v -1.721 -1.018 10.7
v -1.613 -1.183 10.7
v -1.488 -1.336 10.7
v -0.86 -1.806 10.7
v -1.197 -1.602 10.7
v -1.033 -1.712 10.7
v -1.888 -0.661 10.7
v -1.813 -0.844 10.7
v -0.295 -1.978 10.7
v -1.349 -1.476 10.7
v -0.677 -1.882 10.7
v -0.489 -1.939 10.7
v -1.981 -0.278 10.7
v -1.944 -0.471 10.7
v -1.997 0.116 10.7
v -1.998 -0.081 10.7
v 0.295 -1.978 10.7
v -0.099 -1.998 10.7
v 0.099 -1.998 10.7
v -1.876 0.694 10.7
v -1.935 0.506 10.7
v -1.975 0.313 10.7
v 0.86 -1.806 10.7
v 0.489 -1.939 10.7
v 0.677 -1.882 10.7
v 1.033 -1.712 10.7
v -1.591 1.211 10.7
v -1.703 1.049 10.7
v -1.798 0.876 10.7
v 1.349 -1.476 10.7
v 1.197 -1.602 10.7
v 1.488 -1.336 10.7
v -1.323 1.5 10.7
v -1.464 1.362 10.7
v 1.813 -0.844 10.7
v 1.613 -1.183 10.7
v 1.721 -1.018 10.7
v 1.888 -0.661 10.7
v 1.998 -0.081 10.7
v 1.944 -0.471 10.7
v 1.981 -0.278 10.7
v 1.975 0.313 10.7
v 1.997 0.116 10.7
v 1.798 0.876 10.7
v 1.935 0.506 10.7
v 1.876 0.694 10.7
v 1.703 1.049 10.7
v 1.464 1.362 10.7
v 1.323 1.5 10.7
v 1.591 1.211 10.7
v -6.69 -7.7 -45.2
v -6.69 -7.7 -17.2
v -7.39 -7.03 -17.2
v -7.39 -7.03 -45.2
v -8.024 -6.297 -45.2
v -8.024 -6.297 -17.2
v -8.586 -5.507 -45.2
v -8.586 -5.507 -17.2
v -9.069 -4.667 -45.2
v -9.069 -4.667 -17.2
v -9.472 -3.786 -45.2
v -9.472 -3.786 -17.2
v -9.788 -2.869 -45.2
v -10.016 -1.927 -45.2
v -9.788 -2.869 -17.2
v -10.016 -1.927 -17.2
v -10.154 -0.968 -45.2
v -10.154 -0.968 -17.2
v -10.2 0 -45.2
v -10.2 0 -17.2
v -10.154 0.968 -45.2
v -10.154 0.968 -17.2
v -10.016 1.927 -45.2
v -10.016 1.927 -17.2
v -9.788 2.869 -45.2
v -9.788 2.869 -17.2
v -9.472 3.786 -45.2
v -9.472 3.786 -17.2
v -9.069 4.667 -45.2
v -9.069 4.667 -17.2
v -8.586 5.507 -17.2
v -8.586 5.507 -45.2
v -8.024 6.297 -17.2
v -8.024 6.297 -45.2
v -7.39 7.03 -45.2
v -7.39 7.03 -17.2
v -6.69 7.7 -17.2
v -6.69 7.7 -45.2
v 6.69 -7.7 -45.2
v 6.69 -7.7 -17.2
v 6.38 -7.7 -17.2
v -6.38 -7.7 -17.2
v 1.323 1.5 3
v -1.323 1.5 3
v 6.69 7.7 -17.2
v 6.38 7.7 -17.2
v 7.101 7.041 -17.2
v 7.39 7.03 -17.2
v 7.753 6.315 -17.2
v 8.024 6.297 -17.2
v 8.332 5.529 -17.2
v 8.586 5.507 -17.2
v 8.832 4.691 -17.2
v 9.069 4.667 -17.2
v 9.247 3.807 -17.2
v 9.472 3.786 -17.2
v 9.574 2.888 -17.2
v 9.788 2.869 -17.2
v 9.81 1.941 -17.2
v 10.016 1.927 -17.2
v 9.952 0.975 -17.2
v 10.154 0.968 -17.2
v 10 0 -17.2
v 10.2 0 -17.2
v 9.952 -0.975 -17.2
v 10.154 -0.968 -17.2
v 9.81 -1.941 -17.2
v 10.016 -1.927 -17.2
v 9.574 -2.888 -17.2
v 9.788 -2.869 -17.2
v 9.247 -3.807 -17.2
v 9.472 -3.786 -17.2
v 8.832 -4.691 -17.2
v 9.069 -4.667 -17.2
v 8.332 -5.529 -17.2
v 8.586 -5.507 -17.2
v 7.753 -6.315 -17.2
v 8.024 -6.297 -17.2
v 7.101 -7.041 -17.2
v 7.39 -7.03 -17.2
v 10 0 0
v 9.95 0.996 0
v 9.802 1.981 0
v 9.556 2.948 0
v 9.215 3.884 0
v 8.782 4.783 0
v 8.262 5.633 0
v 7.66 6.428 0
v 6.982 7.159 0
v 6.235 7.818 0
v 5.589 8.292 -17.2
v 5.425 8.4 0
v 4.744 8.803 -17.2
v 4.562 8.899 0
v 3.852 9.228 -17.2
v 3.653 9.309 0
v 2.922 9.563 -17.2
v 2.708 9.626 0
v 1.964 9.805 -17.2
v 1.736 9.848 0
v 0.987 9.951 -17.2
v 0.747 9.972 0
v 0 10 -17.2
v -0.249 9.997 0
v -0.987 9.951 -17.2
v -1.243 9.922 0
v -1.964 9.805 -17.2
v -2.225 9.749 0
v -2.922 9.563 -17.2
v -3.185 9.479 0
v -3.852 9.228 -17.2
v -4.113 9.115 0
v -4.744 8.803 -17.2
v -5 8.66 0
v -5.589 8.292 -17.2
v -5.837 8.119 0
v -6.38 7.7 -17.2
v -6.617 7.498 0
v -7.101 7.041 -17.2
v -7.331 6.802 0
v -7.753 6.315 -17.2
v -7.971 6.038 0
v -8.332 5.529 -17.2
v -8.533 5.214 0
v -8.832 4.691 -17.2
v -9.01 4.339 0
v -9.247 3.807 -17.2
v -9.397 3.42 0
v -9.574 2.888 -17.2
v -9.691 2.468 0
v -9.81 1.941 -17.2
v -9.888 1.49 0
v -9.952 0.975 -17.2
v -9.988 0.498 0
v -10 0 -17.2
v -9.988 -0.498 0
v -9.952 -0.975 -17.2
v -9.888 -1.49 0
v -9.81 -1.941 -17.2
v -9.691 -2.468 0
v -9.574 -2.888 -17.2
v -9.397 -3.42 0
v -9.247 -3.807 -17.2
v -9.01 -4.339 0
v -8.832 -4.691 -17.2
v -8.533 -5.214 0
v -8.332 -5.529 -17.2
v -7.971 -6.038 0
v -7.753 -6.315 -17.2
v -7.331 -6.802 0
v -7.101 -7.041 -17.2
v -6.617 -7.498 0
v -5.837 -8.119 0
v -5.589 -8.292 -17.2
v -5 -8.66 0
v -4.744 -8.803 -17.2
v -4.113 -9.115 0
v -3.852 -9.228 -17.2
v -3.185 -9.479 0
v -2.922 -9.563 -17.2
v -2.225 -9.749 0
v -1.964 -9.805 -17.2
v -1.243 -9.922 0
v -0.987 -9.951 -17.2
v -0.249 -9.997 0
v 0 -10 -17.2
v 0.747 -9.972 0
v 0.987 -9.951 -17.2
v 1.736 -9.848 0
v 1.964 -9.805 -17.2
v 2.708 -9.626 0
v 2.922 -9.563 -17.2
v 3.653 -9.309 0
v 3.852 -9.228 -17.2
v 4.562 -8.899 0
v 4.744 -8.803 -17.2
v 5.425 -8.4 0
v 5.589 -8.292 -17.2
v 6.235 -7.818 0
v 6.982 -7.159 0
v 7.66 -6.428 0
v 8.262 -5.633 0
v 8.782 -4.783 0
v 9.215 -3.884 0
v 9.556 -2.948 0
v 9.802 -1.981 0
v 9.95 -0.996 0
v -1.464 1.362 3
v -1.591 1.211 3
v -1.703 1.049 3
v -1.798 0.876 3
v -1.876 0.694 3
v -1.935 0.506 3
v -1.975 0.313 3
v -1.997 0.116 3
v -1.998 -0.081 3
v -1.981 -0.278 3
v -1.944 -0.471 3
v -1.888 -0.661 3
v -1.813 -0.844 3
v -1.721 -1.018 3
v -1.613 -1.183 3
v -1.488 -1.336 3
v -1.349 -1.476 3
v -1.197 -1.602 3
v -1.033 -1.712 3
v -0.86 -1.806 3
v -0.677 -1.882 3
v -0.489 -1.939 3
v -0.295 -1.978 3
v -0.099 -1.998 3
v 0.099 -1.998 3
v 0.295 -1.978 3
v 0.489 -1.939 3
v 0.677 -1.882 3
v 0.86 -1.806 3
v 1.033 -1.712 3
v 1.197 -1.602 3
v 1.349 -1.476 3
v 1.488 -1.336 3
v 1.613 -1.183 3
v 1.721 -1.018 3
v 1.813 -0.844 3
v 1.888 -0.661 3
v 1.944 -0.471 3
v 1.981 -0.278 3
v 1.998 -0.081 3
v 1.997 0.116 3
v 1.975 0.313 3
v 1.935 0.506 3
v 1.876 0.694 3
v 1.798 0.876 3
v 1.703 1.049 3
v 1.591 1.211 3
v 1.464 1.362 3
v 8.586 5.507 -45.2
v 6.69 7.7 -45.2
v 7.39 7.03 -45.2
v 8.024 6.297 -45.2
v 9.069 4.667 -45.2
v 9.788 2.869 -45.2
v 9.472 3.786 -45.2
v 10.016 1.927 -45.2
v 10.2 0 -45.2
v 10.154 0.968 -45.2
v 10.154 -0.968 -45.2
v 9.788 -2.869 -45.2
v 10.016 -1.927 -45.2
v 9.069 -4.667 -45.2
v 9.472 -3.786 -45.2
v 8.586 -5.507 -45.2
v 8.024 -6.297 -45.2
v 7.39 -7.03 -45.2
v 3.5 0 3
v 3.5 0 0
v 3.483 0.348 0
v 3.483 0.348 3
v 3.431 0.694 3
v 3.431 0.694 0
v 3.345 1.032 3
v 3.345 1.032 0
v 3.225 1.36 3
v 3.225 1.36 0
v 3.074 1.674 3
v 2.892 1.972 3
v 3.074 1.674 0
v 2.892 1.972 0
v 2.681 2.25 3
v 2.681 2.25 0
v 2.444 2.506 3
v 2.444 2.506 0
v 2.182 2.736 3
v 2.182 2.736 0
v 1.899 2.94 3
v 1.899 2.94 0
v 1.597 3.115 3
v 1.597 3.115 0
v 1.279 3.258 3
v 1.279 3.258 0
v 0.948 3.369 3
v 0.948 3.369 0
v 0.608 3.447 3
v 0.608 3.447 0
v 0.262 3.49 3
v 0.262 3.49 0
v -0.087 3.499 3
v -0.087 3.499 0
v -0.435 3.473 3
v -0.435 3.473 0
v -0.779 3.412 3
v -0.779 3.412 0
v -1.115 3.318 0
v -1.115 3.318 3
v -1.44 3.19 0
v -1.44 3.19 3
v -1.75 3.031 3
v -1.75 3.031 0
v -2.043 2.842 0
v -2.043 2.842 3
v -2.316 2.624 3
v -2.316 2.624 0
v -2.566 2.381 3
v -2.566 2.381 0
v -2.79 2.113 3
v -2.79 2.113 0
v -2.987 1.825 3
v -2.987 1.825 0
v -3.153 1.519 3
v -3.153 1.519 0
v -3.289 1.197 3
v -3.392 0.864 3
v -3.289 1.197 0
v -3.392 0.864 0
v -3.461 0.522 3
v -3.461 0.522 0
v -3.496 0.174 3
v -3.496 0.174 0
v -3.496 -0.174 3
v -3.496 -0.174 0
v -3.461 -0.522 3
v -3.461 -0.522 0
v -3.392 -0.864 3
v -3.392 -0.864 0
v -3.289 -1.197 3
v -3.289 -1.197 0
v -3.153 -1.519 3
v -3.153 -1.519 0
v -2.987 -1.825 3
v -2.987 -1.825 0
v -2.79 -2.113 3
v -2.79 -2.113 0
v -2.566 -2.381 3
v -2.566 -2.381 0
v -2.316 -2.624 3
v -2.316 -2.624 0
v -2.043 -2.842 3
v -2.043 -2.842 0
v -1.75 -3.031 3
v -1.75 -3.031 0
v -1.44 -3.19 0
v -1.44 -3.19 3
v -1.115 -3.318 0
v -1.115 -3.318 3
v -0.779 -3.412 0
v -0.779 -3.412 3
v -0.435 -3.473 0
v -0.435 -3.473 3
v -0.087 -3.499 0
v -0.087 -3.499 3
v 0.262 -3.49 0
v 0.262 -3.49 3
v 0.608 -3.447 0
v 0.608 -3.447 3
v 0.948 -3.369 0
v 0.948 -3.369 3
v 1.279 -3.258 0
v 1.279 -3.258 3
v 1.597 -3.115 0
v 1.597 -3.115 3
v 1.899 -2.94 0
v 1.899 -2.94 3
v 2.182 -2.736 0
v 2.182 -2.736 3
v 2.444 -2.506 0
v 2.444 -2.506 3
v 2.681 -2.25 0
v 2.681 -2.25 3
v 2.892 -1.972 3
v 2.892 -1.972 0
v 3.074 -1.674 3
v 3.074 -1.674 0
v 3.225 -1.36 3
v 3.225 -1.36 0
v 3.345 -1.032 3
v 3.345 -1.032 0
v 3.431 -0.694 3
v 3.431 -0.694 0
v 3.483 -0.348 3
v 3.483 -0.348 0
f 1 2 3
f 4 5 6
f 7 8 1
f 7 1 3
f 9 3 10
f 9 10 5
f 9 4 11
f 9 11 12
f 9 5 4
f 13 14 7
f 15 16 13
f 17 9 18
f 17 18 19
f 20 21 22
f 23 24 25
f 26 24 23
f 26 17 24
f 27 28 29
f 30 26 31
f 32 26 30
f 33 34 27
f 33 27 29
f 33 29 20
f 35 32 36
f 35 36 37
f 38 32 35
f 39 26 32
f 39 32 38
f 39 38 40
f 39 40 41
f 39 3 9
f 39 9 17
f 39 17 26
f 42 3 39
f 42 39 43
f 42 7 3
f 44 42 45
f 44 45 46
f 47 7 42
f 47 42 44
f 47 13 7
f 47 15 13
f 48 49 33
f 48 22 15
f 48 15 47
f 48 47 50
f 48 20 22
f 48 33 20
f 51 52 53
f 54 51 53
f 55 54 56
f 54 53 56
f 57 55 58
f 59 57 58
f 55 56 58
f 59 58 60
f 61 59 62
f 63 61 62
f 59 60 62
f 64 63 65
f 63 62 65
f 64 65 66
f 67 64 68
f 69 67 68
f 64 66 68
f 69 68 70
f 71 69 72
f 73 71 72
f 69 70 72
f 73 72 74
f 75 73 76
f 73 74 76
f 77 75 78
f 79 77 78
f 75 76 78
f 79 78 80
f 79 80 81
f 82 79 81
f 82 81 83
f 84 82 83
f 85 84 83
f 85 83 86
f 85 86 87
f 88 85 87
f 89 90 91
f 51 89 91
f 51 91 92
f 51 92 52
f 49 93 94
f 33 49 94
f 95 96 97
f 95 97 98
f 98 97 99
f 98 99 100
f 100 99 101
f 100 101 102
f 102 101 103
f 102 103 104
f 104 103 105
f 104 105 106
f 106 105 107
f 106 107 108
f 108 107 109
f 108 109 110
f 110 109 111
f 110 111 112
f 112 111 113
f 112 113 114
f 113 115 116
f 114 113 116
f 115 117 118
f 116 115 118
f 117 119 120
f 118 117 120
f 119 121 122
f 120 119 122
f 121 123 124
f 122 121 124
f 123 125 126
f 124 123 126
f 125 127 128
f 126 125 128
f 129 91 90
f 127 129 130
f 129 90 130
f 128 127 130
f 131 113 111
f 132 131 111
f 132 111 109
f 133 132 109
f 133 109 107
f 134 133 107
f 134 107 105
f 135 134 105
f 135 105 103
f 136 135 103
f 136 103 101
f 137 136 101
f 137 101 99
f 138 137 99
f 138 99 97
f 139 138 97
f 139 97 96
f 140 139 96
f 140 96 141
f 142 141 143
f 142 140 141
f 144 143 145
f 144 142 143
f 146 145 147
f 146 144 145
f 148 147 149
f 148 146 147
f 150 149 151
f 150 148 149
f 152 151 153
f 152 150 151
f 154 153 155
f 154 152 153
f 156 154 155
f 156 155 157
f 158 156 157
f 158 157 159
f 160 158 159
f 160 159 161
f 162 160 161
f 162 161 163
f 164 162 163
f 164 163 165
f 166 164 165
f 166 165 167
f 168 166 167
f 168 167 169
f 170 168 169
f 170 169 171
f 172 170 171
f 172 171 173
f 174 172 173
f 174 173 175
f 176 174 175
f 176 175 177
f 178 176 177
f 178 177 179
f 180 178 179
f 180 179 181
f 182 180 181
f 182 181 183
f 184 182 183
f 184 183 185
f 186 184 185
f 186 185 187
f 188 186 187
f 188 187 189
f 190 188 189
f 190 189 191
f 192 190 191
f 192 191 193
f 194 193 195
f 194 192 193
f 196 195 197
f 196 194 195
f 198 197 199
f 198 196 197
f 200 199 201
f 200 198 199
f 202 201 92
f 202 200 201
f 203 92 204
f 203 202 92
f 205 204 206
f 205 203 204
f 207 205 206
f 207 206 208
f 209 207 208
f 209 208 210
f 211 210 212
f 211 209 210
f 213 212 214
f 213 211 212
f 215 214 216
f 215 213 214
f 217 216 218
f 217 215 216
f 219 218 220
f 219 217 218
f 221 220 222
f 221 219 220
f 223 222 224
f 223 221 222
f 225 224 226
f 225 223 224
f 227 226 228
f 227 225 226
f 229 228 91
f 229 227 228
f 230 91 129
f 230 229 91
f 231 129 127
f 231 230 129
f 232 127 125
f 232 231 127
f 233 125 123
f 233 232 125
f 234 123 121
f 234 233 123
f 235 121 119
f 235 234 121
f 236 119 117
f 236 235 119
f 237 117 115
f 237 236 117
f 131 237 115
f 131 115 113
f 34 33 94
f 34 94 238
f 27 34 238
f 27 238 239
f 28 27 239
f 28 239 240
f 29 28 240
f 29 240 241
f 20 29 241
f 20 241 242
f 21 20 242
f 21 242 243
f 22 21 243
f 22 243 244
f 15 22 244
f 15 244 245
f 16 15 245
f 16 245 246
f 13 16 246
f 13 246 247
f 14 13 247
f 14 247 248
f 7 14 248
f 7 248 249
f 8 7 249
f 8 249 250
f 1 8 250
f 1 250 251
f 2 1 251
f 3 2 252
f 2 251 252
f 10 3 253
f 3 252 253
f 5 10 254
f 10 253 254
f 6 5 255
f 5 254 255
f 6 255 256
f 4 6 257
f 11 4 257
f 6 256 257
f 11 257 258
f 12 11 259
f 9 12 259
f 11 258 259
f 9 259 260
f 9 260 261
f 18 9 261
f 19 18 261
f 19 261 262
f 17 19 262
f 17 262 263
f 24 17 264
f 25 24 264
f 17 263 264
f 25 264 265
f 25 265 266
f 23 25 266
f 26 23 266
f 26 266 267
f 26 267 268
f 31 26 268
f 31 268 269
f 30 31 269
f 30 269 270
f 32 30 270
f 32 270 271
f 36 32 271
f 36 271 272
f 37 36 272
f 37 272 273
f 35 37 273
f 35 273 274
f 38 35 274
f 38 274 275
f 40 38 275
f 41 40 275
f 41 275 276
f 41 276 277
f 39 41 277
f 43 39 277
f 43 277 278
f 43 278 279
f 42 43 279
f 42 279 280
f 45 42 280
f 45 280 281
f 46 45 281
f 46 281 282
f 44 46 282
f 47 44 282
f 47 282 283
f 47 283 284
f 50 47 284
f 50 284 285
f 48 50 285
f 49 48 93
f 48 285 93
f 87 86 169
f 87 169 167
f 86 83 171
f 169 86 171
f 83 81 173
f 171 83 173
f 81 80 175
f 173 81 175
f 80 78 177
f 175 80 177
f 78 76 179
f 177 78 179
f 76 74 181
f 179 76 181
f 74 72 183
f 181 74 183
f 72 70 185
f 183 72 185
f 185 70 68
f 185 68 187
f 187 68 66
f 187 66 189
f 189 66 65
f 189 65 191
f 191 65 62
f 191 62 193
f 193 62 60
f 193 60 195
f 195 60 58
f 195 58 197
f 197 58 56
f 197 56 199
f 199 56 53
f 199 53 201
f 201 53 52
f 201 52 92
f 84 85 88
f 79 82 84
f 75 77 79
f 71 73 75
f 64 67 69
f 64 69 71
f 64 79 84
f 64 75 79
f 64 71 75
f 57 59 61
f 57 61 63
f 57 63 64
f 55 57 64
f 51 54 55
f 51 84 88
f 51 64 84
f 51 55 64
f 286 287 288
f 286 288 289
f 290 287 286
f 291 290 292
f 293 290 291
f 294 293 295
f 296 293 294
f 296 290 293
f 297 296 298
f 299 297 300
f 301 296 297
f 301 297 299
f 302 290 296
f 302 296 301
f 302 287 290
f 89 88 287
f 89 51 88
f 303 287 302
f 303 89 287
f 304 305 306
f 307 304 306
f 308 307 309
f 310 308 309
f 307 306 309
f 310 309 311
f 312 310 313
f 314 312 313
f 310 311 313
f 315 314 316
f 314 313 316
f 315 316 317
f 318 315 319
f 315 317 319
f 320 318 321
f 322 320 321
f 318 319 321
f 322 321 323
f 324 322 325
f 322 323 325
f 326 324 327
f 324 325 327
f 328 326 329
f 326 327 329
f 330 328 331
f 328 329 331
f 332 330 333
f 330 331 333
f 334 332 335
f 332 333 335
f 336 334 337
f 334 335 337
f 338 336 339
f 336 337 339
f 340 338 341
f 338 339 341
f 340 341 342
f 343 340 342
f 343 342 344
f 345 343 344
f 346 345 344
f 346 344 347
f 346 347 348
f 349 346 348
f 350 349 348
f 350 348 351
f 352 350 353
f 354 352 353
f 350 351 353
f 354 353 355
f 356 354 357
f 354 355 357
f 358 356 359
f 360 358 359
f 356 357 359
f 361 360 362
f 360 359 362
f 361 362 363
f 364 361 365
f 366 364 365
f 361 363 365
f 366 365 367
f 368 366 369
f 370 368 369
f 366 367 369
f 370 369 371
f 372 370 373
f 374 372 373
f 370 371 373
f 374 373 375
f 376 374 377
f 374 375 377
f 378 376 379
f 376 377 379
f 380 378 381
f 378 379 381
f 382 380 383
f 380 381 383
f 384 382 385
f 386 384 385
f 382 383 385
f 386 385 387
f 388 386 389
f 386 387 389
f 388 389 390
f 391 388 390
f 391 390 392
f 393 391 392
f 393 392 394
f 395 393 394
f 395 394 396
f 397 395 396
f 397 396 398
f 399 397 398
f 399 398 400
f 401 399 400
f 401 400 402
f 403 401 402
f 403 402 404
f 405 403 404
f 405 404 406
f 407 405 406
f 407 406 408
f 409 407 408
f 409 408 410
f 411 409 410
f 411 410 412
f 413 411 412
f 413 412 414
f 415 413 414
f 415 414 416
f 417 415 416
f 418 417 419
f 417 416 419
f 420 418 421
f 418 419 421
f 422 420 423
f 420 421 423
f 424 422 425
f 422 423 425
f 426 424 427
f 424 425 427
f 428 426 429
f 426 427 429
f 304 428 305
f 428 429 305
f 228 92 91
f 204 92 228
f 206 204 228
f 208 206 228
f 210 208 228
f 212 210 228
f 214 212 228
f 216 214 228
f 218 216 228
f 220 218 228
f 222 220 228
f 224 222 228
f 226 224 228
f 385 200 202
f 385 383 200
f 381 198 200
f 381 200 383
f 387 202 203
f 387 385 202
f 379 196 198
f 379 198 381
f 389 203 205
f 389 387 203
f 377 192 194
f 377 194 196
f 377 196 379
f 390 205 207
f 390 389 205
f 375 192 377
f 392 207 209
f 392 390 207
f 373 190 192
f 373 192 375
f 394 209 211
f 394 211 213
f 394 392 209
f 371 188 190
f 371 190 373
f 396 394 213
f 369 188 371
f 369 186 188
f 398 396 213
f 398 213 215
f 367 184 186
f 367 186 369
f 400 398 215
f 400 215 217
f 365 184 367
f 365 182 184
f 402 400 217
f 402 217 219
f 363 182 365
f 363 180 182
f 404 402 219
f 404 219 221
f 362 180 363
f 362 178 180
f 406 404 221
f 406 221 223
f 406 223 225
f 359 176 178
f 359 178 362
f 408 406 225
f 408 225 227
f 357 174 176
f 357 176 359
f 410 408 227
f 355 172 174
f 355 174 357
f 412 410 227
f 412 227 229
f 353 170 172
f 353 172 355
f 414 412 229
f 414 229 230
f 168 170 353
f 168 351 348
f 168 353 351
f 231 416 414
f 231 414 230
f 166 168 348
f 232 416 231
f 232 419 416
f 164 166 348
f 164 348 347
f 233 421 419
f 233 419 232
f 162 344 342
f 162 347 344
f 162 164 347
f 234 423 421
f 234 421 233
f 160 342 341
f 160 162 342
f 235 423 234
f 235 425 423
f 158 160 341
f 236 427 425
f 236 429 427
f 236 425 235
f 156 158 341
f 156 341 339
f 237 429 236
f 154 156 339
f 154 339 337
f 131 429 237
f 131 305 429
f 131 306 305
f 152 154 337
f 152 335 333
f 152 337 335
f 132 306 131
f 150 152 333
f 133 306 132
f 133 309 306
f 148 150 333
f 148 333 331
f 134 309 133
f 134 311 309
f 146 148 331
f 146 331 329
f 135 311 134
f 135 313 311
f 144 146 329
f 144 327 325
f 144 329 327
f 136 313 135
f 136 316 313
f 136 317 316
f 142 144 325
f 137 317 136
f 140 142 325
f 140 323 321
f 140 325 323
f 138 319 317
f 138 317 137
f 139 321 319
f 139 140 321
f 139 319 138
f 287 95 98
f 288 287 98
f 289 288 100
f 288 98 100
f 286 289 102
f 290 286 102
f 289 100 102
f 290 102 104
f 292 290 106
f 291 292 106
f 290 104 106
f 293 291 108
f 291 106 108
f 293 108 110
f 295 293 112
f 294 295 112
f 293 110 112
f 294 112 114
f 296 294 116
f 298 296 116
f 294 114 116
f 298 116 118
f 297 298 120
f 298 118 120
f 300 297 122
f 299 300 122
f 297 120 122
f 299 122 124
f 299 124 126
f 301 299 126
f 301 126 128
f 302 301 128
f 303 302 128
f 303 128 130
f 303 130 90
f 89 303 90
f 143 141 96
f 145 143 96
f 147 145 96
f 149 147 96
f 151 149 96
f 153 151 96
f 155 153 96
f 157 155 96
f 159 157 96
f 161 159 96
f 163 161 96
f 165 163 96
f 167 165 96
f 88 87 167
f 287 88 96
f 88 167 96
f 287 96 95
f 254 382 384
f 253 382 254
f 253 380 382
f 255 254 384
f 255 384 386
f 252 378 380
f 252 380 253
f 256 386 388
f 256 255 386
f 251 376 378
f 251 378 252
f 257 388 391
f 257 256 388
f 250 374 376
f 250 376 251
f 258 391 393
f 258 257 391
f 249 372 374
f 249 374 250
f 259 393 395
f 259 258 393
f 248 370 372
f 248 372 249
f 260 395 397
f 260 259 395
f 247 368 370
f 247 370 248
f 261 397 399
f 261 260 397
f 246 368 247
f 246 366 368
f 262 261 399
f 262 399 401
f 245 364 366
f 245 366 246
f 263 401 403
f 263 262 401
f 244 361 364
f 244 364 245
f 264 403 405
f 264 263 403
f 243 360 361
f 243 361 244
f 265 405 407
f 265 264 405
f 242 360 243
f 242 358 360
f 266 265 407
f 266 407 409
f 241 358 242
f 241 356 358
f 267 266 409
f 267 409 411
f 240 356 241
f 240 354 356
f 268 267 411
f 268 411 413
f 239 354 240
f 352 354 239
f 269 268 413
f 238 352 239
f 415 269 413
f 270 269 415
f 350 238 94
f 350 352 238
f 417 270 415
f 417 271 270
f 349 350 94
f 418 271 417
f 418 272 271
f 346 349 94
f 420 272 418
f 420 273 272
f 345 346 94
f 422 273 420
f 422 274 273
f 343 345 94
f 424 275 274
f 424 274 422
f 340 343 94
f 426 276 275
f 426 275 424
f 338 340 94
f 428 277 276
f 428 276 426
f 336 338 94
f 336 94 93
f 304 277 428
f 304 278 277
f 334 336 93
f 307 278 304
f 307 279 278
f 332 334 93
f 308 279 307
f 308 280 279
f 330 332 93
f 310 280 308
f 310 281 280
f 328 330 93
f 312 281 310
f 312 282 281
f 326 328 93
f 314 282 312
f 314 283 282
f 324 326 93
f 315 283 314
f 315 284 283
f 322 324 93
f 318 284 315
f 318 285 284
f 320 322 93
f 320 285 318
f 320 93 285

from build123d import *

# Parameters (mm, degrees)
F0_R     = 10
F0_R_2   = 3.5
F1_DEPTH = 17.2
F2_DEPTH = 3
F3_DEPTH = 10.7
F5_DEPTH = 28


with BuildPart() as f1:
    # F0 (on Top) → F1 (new body)
    with BuildSketch(Plane.XY):
        Circle(F0_R)
        Circle(F0_R_2, mode=Mode.SUBTRACT)
        Circle(F0_R_2)
        with BuildLine():
            ThreePointArc((1.3228756555, 1.5), (0, -2), (-1.3228756555, 1.5))
            Line((-1.3228756555, 1.5), (1.3228756555, 1.5))
        make_face(mode=Mode.SUBTRACT)
        with BuildLine():
            Line((1.3228756555, 1.5), (-1.3228756555, 1.5))
            ThreePointArc((-1.3228756555, 1.5), (0, -2), (1.3228756555, 1.5))
        make_face()
    extrude(amount=-F1_DEPTH)

    # F0 (on Top) → F2 (join)
    with BuildSketch(Plane.XY):
        Circle(F0_R_2)
        with BuildLine():
            ThreePointArc((1.3228756555, 1.5), (0, -2), (-1.3228756555, 1.5))
            Line((-1.3228756555, 1.5), (1.3228756555, 1.5))
        make_face(mode=Mode.SUBTRACT)
        with BuildLine():
            Line((1.3228756555, 1.5), (-1.3228756555, 1.5))
            ThreePointArc((-1.3228756555, 1.5), (0, -2), (1.3228756555, 1.5))
        make_face()
    extrude(amount=F2_DEPTH)

    # F0 (on Top) → F3 (join)
    with BuildSketch(Plane.XY):
        with BuildLine():
            Line((1.3228756555, 1.5), (-1.3228756555, 1.5))
            ThreePointArc((-1.3228756555, 1.5), (0, -2), (1.3228756555, 1.5))
        make_face()
    extrude(amount=F3_DEPTH)

    # F4 (on face) → F5 (join)
    with BuildSketch(Plane(origin=(0, 0, -17.2), x_dir=(1, 0, 0), z_dir=(0, 0, -1))):
        with BuildLine():
            ThreePointArc((-6.3804388564, -7.7), (-10, 0), (-6.3804388564, 7.7))
            Line((-6.3804388564, 7.7), (-6.6895440801, 7.7))
            ThreePointArc((-6.6895440801, 7.7), (-10.2, 0), (-6.6895440801, -7.7))
            Line((-6.6895440801, -7.7), (-6.3804388564, -7.7))
        make_face()
        with BuildLine():
            ThreePointArc((10, 0), (9.0499831095, 4.2541515862), (6.3804388564, 7.7))
            Line((6.3804388564, 7.7), (-6.3804388564, 7.7))
            ThreePointArc((-6.3804388564, 7.7), (-10, 0), (-6.3804388564, -7.7))
            Line((-6.3804388564, -7.7), (6.3804388564, -7.7))
            ThreePointArc((6.3804388564, -7.7), (9.0499831095, -4.2541515862), (10, 0))
        make_face()
        with BuildLine():
            ThreePointArc((6.6895440801, -7.7), (10.2, 0), (6.6895440801, 7.7))
            Line((6.6895440801, 7.7), (6.3804388564, 7.7))
            ThreePointArc((6.3804388564, 7.7), (9.0499831095, 4.2541515862), (10, 0))
            ThreePointArc((10, 0), (9.0499831095, -4.2541515862), (6.3804388564, -7.7))
            Line((6.3804388564, -7.7), (6.6895440801, -7.7))
        make_face()
    extrude(amount=F5_DEPTH)


solid = f1.part
